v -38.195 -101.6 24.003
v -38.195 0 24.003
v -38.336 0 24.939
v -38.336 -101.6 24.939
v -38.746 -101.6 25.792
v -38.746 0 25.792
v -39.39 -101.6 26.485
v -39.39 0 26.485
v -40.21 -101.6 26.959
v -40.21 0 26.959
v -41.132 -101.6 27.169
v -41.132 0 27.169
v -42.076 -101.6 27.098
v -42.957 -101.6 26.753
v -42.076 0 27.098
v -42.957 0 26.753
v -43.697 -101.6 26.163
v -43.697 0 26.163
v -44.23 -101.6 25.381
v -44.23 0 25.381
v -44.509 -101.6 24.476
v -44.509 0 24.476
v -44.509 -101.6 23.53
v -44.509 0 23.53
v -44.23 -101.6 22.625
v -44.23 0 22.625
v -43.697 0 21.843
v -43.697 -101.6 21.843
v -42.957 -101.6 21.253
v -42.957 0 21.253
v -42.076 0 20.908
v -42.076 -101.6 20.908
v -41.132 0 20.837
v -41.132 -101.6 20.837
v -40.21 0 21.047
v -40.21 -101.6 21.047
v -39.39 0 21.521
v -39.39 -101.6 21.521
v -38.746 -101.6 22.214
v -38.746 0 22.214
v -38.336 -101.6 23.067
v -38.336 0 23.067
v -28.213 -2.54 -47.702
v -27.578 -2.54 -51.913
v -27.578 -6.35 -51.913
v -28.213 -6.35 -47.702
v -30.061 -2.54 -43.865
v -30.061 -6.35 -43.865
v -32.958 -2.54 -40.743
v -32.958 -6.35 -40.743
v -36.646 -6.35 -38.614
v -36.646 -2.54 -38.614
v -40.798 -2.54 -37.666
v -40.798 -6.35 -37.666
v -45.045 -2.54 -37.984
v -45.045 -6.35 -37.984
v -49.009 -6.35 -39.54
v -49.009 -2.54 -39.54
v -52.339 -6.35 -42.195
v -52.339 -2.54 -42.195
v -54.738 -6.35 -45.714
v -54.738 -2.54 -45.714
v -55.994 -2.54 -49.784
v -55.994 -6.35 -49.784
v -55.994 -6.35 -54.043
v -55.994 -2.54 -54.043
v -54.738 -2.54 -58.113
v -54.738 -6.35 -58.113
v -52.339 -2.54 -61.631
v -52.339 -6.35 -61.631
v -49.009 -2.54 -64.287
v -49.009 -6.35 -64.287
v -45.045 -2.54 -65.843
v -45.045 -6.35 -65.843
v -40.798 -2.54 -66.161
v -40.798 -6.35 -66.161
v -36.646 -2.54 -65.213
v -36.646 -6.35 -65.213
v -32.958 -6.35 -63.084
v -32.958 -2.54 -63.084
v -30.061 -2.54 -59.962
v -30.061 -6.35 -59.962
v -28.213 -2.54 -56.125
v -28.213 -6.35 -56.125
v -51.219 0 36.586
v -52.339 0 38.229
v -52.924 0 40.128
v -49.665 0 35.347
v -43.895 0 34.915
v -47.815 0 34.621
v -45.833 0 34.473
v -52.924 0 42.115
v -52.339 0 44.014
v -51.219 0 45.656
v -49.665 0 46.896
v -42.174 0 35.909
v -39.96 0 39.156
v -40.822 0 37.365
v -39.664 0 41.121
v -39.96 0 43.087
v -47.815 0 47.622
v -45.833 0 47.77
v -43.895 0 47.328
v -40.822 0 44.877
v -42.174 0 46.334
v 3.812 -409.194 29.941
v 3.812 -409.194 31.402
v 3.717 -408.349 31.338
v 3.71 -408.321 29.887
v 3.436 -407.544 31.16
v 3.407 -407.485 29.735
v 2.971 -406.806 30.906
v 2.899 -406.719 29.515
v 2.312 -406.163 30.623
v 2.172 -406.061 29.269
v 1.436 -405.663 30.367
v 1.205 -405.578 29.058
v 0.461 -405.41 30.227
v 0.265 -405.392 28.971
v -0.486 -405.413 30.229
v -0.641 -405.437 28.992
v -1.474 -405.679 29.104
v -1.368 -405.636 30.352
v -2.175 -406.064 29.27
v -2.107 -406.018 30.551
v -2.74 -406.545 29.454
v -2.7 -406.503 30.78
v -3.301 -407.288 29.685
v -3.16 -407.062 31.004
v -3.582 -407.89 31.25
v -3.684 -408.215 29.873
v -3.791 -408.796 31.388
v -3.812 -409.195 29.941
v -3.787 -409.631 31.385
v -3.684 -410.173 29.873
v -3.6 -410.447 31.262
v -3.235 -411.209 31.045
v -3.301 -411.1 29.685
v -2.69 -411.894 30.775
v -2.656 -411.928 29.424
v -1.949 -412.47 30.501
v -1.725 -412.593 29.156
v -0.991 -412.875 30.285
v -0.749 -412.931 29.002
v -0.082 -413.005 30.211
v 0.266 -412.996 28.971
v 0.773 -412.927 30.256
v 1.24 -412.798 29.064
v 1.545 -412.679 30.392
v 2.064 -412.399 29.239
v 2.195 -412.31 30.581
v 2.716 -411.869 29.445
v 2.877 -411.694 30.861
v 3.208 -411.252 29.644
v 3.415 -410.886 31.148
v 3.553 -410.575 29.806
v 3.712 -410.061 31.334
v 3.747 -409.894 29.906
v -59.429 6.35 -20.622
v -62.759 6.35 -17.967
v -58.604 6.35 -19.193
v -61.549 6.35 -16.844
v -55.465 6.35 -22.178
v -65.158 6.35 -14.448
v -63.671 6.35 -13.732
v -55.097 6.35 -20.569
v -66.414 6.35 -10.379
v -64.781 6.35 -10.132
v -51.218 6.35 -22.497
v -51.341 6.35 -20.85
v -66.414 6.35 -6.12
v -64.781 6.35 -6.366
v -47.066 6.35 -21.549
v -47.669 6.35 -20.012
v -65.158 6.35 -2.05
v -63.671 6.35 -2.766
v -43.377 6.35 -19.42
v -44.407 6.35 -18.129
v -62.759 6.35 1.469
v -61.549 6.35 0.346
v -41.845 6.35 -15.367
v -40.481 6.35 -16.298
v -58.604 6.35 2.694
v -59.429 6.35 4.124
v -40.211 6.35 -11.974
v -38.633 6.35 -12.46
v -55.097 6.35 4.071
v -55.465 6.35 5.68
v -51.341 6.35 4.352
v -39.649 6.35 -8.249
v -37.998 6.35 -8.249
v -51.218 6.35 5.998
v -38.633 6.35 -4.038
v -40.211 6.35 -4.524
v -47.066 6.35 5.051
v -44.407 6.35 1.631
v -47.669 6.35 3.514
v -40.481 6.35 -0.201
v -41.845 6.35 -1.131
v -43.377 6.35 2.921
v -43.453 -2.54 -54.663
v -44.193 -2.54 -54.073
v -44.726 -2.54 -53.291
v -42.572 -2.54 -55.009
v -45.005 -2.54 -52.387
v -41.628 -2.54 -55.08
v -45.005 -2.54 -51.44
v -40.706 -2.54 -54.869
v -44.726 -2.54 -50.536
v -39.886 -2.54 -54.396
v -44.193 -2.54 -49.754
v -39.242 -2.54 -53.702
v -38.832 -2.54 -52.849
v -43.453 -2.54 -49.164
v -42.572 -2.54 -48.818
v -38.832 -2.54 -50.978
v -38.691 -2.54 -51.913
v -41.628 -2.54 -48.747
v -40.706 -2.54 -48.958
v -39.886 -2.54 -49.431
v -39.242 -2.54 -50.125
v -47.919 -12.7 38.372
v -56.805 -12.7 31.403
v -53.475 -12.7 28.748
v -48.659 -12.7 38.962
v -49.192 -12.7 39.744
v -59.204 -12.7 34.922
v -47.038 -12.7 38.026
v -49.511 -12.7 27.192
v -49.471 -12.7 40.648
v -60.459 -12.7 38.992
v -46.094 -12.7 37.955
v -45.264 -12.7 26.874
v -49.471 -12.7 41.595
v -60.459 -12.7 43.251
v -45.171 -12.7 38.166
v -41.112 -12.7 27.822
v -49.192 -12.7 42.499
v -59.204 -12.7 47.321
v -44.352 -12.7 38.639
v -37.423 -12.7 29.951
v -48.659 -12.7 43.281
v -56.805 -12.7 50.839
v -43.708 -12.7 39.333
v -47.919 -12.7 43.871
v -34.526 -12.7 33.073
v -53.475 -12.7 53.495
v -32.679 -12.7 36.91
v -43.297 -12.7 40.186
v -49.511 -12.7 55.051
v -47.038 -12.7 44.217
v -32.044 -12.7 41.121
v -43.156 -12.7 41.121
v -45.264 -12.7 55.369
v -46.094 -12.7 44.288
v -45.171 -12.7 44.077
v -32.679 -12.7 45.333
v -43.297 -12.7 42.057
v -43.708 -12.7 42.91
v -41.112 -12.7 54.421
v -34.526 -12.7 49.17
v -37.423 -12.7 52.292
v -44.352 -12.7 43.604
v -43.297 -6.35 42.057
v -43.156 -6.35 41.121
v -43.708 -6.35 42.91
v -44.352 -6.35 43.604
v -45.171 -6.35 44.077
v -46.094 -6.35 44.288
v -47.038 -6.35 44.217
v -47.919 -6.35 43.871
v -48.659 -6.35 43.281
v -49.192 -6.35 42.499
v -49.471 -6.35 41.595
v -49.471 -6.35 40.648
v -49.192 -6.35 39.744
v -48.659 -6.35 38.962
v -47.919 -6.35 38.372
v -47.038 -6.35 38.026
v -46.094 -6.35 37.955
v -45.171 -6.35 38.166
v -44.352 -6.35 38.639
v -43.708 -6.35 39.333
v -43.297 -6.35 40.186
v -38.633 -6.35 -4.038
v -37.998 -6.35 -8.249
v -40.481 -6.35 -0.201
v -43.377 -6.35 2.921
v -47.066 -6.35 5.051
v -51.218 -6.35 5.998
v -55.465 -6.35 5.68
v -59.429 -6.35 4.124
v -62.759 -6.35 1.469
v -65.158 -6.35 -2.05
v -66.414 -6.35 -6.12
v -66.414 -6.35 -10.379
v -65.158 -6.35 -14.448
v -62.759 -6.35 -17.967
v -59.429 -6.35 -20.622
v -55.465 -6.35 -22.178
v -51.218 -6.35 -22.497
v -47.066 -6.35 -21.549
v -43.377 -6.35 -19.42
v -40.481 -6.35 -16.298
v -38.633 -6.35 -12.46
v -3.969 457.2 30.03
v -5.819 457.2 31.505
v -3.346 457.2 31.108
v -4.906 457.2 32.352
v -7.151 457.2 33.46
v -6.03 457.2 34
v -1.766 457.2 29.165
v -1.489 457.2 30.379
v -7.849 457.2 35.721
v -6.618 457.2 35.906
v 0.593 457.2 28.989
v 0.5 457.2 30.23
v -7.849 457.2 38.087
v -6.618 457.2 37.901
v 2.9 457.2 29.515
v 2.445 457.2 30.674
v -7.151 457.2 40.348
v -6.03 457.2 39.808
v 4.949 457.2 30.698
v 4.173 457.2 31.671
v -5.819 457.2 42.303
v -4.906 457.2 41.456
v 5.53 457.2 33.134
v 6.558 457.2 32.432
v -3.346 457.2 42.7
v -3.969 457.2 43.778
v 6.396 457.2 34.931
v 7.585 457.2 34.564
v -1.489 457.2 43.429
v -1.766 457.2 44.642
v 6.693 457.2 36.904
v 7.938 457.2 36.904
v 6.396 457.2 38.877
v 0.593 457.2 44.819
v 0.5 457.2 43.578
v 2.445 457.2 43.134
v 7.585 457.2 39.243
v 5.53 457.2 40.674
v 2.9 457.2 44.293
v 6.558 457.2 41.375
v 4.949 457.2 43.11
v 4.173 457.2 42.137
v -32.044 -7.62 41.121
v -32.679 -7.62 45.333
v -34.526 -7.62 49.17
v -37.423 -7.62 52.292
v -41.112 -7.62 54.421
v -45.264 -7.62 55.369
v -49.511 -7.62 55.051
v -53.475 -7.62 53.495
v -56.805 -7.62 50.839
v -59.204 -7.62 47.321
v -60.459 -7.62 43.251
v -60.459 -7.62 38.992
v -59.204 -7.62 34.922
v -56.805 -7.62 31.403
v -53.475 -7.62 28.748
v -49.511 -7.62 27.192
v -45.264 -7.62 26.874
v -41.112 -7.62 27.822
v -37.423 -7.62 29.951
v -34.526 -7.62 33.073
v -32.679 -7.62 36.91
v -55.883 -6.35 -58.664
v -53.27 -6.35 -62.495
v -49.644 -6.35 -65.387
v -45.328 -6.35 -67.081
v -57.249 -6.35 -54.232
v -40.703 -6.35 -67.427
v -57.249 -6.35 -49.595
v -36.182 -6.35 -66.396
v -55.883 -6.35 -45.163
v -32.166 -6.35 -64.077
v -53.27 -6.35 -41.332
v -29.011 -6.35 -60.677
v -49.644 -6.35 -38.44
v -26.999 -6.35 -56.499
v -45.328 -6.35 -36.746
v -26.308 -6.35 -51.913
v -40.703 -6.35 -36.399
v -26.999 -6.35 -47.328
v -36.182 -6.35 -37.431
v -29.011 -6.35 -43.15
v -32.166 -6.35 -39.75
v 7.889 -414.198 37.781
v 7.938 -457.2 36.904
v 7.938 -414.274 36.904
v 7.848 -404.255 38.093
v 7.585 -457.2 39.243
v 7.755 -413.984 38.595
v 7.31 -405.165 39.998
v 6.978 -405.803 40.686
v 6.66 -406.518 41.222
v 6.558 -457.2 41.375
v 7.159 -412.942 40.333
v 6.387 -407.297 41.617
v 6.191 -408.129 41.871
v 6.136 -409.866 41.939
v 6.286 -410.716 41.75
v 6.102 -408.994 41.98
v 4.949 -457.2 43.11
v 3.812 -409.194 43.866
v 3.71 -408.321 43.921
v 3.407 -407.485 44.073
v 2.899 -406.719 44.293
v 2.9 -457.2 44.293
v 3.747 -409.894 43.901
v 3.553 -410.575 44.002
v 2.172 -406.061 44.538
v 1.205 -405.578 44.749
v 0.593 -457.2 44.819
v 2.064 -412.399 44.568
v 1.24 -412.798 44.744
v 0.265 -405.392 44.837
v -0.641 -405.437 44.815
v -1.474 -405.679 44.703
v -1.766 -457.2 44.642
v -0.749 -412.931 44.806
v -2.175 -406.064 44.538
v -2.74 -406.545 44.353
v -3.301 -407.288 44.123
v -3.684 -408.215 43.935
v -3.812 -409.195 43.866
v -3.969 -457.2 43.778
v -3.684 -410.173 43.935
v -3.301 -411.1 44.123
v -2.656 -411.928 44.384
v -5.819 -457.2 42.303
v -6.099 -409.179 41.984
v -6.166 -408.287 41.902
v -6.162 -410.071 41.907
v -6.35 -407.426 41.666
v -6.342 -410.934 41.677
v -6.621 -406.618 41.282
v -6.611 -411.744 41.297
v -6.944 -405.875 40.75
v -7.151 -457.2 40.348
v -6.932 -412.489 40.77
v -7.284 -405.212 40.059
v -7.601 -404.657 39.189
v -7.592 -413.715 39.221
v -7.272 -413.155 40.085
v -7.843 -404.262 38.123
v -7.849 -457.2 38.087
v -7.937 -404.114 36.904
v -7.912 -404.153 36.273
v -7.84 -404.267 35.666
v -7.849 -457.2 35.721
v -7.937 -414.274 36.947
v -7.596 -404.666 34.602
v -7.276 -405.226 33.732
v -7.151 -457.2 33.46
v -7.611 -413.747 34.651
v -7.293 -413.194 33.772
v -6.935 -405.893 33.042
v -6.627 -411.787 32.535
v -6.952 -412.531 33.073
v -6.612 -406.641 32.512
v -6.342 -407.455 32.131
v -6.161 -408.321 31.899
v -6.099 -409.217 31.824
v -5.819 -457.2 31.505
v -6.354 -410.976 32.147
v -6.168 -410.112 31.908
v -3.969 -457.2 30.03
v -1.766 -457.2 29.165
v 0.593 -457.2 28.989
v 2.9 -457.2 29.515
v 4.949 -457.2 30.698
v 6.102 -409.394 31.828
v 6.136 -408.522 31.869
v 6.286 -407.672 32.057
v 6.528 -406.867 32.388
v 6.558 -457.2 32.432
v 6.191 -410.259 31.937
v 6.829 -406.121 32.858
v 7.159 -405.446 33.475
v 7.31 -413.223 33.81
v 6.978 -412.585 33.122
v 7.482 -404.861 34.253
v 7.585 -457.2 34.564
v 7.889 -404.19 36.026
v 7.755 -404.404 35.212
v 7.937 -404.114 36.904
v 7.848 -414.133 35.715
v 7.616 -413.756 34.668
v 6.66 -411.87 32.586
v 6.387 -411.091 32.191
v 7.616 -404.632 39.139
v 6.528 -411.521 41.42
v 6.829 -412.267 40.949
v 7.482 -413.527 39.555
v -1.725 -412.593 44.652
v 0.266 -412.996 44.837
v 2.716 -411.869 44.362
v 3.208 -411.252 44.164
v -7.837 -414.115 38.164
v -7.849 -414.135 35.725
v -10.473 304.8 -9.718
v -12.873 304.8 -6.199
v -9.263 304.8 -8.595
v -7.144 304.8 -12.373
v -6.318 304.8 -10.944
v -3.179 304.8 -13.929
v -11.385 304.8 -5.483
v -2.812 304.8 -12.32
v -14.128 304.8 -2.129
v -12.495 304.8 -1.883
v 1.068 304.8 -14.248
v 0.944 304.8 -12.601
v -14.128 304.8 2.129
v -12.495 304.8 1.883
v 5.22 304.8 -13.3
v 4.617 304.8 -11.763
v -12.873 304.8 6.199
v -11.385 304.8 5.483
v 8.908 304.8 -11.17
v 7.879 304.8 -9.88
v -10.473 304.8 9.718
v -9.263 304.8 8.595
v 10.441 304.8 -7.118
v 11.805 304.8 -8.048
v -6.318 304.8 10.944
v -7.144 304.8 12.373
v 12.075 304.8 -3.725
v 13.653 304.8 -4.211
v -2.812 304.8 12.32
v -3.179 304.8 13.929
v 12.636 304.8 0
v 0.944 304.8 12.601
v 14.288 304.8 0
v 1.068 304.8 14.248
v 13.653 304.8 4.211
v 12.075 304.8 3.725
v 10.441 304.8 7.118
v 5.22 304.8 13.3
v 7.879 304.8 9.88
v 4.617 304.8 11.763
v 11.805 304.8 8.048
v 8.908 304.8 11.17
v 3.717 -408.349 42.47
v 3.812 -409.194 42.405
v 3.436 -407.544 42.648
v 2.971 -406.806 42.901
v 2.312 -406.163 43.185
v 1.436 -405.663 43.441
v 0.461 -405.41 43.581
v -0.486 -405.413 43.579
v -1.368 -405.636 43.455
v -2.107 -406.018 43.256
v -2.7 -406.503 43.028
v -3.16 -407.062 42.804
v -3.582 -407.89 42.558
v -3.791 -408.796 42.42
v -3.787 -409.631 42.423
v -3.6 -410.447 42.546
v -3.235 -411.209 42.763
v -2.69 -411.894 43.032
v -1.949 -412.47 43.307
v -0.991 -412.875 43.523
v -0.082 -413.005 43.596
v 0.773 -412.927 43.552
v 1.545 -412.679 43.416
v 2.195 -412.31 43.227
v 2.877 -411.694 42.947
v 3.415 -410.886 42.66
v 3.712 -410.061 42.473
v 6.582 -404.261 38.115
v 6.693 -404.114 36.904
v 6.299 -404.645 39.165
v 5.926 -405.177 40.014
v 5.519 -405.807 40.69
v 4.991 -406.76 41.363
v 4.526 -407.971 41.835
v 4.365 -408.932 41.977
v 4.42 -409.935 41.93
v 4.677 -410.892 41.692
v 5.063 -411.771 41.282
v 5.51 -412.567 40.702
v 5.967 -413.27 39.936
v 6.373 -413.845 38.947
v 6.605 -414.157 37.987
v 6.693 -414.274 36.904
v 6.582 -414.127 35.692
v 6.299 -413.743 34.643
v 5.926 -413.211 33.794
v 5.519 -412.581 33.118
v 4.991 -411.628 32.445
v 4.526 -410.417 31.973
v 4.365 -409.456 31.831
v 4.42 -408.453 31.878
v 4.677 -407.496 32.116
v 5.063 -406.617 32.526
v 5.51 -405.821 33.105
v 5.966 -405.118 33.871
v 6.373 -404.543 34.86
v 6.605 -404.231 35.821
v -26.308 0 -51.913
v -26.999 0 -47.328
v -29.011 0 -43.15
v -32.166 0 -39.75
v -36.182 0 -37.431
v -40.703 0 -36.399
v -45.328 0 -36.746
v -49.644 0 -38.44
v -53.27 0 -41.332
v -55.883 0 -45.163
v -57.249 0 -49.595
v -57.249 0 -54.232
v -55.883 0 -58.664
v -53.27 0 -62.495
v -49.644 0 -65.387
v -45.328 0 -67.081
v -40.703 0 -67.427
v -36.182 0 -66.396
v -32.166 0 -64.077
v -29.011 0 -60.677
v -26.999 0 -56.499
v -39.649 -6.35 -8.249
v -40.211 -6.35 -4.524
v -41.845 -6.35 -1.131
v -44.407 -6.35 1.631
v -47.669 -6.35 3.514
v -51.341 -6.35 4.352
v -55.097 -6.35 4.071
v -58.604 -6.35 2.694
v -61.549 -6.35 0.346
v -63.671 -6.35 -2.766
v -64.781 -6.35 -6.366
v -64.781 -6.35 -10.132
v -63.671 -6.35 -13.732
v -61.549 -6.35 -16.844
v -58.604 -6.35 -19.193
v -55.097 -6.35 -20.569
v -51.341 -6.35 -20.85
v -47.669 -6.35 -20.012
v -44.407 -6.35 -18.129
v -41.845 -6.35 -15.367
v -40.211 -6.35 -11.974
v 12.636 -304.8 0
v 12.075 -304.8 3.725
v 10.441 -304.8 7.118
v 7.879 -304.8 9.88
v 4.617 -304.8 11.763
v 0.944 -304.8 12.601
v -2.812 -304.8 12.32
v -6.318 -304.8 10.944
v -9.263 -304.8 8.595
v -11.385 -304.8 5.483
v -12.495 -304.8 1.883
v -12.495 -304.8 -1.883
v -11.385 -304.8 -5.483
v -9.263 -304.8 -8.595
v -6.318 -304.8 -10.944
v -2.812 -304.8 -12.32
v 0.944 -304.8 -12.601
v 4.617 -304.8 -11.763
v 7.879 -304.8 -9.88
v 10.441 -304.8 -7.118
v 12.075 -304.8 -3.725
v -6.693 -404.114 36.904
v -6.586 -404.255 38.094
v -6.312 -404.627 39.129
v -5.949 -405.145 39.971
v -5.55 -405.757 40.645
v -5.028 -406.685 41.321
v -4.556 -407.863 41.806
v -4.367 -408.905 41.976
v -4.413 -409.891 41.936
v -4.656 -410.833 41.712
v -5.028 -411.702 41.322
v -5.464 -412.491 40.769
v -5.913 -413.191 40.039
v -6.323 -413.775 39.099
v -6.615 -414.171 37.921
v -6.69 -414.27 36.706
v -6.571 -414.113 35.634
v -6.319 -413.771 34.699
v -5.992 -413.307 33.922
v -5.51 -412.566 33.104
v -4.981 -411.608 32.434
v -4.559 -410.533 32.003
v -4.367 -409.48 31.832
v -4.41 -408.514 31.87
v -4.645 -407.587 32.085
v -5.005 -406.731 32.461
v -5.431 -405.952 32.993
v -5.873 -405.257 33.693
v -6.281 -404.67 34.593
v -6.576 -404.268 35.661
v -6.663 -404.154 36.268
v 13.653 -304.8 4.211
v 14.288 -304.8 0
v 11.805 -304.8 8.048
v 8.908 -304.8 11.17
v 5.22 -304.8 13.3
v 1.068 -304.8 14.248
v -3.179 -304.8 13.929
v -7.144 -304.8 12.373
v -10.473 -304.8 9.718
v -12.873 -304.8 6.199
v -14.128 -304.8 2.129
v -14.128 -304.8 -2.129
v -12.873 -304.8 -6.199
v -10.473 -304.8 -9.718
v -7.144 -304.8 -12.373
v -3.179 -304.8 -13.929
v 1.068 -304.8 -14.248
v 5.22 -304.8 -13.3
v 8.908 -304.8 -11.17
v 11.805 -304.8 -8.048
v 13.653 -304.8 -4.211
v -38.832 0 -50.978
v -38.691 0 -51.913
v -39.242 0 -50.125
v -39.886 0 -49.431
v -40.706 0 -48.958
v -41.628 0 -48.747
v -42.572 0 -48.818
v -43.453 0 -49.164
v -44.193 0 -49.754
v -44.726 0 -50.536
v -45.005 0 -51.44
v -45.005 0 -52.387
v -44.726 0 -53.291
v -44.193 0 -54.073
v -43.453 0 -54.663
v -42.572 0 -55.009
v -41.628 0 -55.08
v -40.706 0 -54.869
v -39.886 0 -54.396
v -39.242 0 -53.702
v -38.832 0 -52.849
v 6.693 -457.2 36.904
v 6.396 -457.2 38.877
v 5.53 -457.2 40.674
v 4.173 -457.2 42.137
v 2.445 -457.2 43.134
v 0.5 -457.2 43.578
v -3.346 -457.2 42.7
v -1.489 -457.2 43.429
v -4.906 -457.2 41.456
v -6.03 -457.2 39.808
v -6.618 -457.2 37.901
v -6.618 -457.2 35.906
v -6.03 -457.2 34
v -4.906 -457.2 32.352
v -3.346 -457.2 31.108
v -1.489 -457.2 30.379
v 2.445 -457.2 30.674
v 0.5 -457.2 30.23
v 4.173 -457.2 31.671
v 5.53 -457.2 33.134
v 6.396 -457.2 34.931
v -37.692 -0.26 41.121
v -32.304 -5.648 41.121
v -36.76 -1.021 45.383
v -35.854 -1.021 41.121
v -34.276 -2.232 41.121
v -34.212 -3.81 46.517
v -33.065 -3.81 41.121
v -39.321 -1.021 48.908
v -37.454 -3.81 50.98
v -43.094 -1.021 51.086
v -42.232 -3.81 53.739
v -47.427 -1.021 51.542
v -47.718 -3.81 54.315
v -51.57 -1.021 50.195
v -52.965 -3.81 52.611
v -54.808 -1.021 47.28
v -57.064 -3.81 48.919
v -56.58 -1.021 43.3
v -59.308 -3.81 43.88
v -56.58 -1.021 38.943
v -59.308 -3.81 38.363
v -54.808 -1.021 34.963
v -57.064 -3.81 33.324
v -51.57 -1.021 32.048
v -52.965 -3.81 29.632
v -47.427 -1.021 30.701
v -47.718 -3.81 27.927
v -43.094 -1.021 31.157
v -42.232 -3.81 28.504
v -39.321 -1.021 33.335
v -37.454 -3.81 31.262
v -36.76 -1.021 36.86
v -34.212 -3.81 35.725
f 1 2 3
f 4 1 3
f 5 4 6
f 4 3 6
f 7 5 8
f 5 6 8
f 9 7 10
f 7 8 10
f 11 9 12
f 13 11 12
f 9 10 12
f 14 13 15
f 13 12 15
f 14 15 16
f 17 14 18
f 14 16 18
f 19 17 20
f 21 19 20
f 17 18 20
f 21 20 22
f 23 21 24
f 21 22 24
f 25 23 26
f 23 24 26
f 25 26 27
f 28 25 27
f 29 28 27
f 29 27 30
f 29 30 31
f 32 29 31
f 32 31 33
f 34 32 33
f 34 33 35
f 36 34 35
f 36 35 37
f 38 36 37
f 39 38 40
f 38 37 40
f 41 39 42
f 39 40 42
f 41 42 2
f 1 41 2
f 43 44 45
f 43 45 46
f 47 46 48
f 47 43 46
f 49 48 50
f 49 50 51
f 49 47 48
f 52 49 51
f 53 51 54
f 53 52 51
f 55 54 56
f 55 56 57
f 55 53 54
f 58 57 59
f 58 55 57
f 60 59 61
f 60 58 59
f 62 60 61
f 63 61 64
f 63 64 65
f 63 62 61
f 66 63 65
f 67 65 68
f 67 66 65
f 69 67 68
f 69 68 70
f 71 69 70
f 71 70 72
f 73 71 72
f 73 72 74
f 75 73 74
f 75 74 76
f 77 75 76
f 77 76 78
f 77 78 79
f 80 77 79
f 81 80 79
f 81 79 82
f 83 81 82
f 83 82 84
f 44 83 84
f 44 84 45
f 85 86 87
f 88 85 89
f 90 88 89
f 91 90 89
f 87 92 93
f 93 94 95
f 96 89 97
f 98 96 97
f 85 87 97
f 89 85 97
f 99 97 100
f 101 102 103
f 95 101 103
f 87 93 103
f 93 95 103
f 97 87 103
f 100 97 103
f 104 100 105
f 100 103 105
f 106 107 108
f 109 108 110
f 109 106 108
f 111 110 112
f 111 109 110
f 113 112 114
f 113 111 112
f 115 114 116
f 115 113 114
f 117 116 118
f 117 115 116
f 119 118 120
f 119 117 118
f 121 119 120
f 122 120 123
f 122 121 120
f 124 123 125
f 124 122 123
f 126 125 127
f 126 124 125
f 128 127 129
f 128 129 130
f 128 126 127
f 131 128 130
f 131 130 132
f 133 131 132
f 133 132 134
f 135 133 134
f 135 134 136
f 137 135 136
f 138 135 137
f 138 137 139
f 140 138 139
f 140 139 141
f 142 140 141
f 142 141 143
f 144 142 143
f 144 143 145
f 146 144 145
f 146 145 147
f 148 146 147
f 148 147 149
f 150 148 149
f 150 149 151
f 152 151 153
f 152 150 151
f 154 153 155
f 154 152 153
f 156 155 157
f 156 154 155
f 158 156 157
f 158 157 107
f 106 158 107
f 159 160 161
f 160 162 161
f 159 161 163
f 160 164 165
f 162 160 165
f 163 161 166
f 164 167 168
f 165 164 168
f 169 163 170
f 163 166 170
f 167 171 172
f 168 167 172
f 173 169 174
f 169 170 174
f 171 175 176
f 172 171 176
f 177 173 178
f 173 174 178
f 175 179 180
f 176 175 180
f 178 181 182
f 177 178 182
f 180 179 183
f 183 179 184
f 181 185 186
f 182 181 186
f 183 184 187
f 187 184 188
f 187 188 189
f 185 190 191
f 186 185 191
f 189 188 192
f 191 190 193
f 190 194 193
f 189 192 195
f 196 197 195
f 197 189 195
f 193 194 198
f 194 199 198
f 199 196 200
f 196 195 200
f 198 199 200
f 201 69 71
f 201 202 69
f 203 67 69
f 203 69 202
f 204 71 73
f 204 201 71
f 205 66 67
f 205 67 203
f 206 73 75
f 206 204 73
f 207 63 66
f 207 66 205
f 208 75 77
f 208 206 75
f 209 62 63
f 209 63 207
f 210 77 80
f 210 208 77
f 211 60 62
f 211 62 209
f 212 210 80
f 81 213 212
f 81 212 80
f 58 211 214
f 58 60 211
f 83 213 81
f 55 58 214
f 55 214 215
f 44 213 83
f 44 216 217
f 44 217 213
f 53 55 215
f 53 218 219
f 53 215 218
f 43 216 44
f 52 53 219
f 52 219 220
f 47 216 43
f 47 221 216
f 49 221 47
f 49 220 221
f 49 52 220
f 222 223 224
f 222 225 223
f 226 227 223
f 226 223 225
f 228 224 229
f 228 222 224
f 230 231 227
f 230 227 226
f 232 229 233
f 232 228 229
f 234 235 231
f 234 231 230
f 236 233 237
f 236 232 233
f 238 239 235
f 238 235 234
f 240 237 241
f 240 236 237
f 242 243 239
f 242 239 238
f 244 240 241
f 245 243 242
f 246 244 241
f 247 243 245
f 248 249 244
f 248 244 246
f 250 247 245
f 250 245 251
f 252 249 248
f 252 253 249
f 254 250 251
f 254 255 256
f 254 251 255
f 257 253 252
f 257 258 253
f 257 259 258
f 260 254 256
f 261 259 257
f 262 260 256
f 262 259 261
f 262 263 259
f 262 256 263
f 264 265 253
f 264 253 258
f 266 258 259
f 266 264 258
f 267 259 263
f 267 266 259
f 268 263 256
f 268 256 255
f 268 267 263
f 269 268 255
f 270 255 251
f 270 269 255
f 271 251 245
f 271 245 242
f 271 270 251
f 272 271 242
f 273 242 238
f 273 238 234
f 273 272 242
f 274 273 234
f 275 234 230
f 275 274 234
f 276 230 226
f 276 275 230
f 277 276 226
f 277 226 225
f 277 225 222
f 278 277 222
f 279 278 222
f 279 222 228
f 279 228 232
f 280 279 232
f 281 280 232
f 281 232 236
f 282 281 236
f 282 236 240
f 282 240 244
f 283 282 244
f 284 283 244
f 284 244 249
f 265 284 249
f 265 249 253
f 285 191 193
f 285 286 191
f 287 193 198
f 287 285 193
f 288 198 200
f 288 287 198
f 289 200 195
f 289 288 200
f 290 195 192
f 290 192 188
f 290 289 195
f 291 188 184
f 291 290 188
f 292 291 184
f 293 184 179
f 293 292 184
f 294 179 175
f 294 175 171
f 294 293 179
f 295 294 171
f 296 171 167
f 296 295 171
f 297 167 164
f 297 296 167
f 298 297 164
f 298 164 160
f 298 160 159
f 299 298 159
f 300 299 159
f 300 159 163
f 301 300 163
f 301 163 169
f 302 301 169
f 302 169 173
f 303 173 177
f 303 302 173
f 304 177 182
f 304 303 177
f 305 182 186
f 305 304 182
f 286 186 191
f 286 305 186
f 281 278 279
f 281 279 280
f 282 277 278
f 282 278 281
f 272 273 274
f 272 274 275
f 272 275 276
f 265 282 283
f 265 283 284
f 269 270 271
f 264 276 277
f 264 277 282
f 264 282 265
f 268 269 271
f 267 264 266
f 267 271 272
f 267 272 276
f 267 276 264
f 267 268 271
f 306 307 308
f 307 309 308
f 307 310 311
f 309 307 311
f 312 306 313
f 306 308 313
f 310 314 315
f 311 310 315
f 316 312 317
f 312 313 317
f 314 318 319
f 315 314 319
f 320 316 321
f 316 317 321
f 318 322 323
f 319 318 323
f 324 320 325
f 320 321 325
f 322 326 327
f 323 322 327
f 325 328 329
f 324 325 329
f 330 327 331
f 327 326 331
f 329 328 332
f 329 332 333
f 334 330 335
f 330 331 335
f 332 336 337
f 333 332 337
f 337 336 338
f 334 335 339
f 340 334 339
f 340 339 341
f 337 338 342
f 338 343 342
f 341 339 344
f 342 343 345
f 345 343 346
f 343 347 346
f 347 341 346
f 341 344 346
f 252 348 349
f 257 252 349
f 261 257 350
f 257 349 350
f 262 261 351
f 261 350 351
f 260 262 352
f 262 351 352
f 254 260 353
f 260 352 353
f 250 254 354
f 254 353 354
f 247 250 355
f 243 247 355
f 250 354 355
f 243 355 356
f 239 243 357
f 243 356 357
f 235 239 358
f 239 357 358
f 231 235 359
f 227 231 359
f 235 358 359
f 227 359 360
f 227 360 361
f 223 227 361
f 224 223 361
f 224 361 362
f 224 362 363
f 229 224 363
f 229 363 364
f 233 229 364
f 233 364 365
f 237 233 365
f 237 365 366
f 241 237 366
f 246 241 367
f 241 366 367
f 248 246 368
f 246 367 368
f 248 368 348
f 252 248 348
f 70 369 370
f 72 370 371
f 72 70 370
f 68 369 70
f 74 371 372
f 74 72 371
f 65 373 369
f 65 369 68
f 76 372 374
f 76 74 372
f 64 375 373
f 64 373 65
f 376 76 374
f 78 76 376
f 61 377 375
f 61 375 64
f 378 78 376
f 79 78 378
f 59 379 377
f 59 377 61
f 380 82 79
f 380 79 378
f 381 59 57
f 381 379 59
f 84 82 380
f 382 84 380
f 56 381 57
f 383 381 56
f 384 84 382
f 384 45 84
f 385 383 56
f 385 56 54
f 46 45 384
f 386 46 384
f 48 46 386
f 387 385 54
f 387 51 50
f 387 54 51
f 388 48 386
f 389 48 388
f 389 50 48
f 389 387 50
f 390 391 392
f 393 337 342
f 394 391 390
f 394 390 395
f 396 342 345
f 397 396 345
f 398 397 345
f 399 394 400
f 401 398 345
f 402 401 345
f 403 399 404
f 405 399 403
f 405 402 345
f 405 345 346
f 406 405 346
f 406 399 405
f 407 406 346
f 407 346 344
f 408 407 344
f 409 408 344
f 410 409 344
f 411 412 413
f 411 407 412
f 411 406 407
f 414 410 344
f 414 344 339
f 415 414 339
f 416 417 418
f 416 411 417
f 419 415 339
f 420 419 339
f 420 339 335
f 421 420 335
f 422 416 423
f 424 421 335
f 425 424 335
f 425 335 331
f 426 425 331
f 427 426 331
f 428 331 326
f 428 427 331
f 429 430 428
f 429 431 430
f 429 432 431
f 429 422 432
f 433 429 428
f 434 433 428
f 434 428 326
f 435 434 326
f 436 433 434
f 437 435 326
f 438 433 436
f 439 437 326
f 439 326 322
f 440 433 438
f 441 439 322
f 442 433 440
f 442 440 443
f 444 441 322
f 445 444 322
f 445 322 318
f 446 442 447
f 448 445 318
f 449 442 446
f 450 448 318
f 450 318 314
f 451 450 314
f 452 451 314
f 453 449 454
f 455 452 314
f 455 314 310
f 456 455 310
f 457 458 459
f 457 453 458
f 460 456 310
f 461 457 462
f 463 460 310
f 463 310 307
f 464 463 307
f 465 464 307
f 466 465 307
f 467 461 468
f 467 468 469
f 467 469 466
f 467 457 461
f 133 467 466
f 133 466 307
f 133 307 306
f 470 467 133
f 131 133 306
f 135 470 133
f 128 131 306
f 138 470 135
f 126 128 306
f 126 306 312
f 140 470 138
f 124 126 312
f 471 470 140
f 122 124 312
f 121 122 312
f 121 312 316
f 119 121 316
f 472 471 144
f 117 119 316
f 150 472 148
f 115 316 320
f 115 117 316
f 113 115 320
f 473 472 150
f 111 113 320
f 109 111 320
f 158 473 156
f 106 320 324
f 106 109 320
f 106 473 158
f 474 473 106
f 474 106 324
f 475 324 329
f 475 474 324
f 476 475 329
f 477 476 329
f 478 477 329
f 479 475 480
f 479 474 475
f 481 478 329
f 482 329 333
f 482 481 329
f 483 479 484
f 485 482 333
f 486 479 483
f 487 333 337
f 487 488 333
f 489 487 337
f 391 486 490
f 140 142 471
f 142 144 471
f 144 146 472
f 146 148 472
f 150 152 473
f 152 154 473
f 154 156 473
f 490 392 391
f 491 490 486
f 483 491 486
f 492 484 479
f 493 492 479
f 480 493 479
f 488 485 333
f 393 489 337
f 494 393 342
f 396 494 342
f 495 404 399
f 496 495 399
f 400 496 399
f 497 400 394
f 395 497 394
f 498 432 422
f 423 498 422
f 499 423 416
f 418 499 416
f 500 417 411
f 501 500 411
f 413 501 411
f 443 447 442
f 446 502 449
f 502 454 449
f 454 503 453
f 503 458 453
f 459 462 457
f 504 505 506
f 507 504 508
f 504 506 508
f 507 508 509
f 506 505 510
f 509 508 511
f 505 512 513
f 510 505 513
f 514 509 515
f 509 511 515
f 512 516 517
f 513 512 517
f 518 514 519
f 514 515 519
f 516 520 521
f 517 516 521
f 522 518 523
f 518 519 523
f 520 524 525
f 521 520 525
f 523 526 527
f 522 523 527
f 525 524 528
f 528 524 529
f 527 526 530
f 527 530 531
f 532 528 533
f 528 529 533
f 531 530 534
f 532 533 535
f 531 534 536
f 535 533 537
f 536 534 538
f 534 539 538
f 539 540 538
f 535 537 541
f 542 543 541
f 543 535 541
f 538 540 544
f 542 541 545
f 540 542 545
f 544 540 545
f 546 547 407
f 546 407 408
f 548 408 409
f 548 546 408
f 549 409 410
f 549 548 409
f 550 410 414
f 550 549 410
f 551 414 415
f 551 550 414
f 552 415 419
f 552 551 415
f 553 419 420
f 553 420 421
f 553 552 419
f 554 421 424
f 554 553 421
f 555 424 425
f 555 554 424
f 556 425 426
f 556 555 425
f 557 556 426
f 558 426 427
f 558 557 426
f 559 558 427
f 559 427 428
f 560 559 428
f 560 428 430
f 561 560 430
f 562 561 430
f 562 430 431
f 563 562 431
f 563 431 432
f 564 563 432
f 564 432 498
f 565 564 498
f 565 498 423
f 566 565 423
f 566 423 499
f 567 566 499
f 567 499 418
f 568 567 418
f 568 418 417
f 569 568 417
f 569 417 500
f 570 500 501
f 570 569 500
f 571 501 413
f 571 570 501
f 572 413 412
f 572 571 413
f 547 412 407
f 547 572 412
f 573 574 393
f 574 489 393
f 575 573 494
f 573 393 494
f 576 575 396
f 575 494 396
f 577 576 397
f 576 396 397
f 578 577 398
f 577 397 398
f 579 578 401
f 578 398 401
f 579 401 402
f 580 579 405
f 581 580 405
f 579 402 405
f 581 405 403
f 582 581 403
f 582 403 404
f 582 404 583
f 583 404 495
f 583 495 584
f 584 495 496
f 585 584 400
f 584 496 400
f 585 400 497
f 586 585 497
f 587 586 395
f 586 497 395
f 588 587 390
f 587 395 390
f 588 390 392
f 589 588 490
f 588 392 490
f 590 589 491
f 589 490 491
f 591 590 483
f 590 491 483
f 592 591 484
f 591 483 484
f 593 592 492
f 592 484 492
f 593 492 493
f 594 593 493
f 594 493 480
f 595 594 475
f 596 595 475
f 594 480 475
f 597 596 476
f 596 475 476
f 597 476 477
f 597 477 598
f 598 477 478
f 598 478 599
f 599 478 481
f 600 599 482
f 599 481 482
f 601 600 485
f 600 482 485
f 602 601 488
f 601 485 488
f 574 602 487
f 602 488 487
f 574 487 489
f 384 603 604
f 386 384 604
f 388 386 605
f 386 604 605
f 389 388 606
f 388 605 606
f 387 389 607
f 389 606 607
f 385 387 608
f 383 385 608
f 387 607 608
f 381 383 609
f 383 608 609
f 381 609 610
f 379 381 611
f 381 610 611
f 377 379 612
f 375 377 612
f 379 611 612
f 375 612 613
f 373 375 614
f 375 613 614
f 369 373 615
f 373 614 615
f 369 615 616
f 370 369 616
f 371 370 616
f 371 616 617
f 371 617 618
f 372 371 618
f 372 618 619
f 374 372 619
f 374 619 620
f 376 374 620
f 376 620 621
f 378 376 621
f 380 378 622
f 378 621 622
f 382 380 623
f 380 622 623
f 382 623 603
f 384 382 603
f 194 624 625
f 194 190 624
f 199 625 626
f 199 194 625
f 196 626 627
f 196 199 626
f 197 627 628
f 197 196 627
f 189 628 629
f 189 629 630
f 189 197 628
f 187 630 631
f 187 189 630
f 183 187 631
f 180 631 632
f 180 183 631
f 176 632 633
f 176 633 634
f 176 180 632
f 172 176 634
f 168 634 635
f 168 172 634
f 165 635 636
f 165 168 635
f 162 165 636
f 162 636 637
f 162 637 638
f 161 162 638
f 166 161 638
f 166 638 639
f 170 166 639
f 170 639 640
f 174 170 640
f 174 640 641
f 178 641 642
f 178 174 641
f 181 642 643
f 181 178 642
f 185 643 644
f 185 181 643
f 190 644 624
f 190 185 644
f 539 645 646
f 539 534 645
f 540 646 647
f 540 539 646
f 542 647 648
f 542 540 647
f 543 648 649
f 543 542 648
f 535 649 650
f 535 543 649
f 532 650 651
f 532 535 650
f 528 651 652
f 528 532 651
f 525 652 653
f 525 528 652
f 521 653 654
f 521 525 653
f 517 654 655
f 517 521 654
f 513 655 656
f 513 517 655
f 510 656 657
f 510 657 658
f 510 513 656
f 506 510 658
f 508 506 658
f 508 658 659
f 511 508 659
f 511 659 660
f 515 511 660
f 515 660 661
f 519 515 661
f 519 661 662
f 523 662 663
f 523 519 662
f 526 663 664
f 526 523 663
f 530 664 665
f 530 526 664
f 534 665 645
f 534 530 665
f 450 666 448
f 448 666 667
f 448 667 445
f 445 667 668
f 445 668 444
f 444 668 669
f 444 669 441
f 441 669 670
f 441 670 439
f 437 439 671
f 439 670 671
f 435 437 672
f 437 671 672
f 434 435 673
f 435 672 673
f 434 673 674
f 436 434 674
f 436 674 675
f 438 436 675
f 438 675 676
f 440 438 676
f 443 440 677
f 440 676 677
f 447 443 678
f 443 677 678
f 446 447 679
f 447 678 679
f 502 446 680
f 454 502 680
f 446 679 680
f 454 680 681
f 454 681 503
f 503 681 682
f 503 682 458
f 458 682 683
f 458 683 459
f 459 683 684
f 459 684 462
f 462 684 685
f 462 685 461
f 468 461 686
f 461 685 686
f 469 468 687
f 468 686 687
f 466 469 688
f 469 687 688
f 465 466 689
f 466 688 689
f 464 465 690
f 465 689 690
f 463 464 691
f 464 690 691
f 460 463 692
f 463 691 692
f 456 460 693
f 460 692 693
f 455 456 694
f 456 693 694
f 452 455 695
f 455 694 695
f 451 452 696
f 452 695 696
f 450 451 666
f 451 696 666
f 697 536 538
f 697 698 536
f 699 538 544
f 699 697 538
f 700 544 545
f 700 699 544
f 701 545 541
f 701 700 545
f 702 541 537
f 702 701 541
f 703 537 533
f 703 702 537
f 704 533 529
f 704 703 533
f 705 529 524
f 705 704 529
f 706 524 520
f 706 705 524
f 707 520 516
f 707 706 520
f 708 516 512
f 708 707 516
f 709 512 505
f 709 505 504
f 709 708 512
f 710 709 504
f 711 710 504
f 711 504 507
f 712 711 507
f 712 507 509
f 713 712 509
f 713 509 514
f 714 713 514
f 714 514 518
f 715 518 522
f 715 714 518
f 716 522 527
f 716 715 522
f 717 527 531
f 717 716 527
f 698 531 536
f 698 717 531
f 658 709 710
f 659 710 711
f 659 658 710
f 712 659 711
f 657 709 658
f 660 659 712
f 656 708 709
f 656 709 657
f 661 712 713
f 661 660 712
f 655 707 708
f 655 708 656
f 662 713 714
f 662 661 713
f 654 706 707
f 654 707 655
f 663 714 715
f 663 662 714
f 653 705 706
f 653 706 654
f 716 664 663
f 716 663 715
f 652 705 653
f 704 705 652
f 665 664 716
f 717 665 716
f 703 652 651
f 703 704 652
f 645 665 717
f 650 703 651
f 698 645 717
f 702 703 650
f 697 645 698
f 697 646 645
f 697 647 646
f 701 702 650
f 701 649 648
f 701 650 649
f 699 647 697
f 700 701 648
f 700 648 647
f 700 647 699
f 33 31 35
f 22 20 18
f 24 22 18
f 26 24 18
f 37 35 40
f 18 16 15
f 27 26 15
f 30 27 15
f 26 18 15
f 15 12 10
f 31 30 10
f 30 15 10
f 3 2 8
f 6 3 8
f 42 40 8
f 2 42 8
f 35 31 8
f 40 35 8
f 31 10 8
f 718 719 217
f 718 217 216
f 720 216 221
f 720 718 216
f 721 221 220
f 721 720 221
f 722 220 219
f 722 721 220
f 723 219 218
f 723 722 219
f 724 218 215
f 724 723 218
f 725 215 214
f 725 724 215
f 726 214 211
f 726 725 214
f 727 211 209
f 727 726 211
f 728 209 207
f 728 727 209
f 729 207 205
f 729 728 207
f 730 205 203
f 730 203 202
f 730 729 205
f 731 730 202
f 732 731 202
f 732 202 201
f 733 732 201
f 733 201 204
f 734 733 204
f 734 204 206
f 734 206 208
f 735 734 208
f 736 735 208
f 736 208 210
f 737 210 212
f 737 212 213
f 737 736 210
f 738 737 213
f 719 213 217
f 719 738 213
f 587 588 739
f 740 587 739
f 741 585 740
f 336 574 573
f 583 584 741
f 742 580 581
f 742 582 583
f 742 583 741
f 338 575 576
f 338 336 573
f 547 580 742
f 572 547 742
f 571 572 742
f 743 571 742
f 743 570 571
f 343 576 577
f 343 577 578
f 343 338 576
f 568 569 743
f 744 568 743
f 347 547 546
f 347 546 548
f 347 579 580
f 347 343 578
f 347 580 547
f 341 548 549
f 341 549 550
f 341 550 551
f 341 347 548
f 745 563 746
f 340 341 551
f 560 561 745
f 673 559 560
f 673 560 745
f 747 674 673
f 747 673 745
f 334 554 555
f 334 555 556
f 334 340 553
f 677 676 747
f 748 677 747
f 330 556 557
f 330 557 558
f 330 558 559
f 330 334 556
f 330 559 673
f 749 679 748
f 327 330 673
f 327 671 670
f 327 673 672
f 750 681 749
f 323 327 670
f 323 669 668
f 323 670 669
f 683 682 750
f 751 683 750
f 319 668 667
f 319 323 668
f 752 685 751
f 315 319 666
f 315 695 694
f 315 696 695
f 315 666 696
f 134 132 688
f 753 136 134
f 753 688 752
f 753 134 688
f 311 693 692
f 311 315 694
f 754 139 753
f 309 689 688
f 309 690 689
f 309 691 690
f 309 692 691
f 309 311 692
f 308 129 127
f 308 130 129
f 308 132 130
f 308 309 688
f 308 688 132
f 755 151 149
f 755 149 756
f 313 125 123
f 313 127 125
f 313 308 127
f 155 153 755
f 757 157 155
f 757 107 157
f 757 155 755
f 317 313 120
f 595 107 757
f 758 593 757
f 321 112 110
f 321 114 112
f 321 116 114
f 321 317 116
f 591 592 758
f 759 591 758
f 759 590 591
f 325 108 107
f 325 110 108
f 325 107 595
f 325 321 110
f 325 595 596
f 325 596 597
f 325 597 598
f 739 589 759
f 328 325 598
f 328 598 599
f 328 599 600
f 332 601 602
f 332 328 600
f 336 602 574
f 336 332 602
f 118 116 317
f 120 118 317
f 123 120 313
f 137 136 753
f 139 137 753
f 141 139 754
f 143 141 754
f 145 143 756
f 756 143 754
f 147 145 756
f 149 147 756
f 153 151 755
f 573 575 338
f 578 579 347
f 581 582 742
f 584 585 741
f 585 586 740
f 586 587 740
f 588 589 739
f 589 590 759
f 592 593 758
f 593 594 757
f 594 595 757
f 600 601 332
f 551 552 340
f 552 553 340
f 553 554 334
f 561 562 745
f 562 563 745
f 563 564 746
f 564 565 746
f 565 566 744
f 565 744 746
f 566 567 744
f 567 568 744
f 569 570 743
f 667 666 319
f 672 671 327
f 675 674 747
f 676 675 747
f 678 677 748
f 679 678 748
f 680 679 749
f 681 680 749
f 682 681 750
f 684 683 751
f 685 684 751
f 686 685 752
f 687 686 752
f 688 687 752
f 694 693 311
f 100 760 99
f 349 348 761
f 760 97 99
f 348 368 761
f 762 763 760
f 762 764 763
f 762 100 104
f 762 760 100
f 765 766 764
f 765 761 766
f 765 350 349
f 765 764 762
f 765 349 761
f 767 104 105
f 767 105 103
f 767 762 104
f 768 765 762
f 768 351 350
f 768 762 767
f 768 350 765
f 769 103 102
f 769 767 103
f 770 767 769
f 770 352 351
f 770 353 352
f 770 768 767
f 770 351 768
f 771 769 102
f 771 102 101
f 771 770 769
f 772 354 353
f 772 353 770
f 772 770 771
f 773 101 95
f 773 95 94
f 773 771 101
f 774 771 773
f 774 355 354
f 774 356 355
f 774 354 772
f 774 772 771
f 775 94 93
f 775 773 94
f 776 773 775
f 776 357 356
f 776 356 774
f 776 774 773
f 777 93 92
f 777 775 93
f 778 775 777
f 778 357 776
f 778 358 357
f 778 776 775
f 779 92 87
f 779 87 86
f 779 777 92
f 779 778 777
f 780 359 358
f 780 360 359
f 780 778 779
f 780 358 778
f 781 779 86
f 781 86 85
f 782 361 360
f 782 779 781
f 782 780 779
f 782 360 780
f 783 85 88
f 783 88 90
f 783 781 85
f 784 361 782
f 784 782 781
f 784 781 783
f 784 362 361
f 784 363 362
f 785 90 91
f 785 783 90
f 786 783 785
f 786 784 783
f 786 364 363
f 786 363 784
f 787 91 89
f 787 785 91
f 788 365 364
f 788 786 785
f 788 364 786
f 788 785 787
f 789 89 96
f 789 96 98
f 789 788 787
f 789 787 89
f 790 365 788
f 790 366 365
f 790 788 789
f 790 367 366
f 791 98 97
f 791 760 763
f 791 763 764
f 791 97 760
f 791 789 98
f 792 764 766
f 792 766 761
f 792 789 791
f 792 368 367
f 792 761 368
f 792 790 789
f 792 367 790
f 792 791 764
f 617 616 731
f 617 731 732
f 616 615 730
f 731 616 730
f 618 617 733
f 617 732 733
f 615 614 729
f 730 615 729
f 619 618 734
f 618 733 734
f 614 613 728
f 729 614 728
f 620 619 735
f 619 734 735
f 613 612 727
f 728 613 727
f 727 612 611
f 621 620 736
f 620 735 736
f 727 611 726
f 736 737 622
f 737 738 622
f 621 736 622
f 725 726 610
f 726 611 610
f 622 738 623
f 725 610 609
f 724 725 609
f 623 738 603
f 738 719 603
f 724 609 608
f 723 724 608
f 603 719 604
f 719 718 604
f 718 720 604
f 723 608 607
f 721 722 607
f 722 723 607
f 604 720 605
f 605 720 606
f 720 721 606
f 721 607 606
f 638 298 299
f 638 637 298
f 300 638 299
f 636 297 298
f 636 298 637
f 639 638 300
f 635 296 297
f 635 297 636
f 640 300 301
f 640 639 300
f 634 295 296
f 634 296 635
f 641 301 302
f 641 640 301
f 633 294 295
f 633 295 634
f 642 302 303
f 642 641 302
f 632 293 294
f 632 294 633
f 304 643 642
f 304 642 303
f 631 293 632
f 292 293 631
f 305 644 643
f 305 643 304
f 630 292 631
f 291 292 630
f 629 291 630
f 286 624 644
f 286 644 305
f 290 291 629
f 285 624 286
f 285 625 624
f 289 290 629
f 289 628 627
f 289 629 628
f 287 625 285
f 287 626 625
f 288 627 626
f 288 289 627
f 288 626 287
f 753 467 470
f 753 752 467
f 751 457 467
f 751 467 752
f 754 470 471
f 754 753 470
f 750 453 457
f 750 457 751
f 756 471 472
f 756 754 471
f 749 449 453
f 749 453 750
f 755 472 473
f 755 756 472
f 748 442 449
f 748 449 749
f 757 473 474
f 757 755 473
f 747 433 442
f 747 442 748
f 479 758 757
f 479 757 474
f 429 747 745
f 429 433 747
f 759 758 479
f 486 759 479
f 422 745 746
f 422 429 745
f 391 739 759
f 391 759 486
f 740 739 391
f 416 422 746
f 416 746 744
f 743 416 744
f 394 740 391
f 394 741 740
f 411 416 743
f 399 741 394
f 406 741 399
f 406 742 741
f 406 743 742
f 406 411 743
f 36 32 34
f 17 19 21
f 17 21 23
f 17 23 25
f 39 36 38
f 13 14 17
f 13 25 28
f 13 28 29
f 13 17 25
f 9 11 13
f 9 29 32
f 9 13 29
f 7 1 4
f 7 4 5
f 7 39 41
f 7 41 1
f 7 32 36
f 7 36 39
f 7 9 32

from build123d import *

# Parameters (mm, degrees)
F0_R      = 14.2875
F0_R_2    = 12.6365
F1_DEPTH  = 304.8
F0_R_3    = 7.9375
F0_R_4    = 6.6929
F2_DEPTH  = 457.2
F0_R_5    = 3.175
F3_DEPTH  = 12.7
F4_DEPTH  = 6.35
F5_R      = 7.62
F6_DEPTH  = 101.6
F7_DEPTH  = 6.35
F8_DEPTH  = 2.54
F0_R_6    = 15.5575
F9_DEPTH  = 6.35
F10_R     = 5.08
F11_DEPTH = 12.7
F12_R     = 3.811671
F13_DEPTH = 55.40992


with BuildPart() as f1:
    # F0 (on Front) → F1 (new body, symmetric)
    with BuildSketch(Plane.XZ):
        Circle(F0_R)
        Circle(F0_R_2, mode=Mode.SUBTRACT)
    extrude(amount=F1_DEPTH, both=True)


with BuildPart() as f2:
    # F0 (on Front) → F2 (new body, symmetric)
    with BuildSketch(Plane.XZ):
        with Locations((0, 36.90384)):
            Circle(F0_R_3)
        with Locations((0, 36.90384)):
            Circle(F0_R_4, mode=Mode.SUBTRACT)
    extrude(amount=F2_DEPTH, both=True)

    # F10 (on Right) → F11 (cut, symmetric)
    with BuildSketch(Plane.YZ):
        with Locations((-409.194, 36.903838)):
            Circle(F10_R)
    extrude(amount=F11_DEPTH, both=True, mode=Mode.SUBTRACT)

    # F12 (on Top) → F13 (cut, through all)
    with BuildSketch(Plane.XY):
        with Locations((0, -409.194)):
            Circle(F12_R)
    extrude(amount=F13_DEPTH, mode=Mode.SUBTRACT)


with BuildPart() as f3:
    # F0 (on Front) → F3 (new body)
    with BuildSketch(Plane.XZ):
        with Locations((-46.331372, 41.12142)):
            Circle(F0_R)
        with Locations((-46.331372, 41.12142)):
            Circle(F0_R_5, mode=Mode.SUBTRACT)
    extrude(amount=F3_DEPTH)

    # F0 (on Front) → F4 (join)
    with BuildSketch(Plane.XZ):
        with Locations((-46.331372, 41.12142)):
            Circle(F0_R_5)
    extrude(amount=F4_DEPTH)

    # F5
    f5_edges = [f3.edges().sort_by_distance(p)[0] for p in [
        (-60.618872, 0, 41.12142),
    ]]
    fillet(f5_edges, radius=F5_R)


with BuildPart() as f6:
    # F0 (on Front) → F6 (new body)
    with BuildSketch(Plane.XZ):
        with Locations((-41.369513, 24.003001)):
            Circle(F0_R_5)
    extrude(amount=F6_DEPTH)


with BuildPart() as f7:
    # F0 (on Front) → F7 (new body, symmetric)
    with BuildSketch(Plane.XZ):
        with Locations((-52.285604, -8.249093)):
            Circle(F0_R)
        with Locations((-52.285604, -8.249093)):
            Circle(F0_R_2, mode=Mode.SUBTRACT)
    extrude(amount=F7_DEPTH, both=True)


with BuildPart() as f8:
    # F0 (on Front) → F8 (new body)
    with BuildSketch(Plane.XZ):
        with Locations((-41.865699, -51.913466)):
            Circle(F0_R)
        with Locations((-41.865699, -51.913466)):
            Circle(F0_R_5, mode=Mode.SUBTRACT)
    extrude(amount=F8_DEPTH)

    # F0 (on Front) → F9 (join)
    with BuildSketch(Plane.XZ):
        with Locations((-41.865699, -51.913466)):
            Circle(F0_R_6)
        with Locations((-41.865699, -51.913466)):
            Circle(F0_R, mode=Mode.SUBTRACT)
    extrude(amount=F9_DEPTH)


solid = Compound([f1.part, f2.part, f3.part, f6.part, f7.part, f8.part])
